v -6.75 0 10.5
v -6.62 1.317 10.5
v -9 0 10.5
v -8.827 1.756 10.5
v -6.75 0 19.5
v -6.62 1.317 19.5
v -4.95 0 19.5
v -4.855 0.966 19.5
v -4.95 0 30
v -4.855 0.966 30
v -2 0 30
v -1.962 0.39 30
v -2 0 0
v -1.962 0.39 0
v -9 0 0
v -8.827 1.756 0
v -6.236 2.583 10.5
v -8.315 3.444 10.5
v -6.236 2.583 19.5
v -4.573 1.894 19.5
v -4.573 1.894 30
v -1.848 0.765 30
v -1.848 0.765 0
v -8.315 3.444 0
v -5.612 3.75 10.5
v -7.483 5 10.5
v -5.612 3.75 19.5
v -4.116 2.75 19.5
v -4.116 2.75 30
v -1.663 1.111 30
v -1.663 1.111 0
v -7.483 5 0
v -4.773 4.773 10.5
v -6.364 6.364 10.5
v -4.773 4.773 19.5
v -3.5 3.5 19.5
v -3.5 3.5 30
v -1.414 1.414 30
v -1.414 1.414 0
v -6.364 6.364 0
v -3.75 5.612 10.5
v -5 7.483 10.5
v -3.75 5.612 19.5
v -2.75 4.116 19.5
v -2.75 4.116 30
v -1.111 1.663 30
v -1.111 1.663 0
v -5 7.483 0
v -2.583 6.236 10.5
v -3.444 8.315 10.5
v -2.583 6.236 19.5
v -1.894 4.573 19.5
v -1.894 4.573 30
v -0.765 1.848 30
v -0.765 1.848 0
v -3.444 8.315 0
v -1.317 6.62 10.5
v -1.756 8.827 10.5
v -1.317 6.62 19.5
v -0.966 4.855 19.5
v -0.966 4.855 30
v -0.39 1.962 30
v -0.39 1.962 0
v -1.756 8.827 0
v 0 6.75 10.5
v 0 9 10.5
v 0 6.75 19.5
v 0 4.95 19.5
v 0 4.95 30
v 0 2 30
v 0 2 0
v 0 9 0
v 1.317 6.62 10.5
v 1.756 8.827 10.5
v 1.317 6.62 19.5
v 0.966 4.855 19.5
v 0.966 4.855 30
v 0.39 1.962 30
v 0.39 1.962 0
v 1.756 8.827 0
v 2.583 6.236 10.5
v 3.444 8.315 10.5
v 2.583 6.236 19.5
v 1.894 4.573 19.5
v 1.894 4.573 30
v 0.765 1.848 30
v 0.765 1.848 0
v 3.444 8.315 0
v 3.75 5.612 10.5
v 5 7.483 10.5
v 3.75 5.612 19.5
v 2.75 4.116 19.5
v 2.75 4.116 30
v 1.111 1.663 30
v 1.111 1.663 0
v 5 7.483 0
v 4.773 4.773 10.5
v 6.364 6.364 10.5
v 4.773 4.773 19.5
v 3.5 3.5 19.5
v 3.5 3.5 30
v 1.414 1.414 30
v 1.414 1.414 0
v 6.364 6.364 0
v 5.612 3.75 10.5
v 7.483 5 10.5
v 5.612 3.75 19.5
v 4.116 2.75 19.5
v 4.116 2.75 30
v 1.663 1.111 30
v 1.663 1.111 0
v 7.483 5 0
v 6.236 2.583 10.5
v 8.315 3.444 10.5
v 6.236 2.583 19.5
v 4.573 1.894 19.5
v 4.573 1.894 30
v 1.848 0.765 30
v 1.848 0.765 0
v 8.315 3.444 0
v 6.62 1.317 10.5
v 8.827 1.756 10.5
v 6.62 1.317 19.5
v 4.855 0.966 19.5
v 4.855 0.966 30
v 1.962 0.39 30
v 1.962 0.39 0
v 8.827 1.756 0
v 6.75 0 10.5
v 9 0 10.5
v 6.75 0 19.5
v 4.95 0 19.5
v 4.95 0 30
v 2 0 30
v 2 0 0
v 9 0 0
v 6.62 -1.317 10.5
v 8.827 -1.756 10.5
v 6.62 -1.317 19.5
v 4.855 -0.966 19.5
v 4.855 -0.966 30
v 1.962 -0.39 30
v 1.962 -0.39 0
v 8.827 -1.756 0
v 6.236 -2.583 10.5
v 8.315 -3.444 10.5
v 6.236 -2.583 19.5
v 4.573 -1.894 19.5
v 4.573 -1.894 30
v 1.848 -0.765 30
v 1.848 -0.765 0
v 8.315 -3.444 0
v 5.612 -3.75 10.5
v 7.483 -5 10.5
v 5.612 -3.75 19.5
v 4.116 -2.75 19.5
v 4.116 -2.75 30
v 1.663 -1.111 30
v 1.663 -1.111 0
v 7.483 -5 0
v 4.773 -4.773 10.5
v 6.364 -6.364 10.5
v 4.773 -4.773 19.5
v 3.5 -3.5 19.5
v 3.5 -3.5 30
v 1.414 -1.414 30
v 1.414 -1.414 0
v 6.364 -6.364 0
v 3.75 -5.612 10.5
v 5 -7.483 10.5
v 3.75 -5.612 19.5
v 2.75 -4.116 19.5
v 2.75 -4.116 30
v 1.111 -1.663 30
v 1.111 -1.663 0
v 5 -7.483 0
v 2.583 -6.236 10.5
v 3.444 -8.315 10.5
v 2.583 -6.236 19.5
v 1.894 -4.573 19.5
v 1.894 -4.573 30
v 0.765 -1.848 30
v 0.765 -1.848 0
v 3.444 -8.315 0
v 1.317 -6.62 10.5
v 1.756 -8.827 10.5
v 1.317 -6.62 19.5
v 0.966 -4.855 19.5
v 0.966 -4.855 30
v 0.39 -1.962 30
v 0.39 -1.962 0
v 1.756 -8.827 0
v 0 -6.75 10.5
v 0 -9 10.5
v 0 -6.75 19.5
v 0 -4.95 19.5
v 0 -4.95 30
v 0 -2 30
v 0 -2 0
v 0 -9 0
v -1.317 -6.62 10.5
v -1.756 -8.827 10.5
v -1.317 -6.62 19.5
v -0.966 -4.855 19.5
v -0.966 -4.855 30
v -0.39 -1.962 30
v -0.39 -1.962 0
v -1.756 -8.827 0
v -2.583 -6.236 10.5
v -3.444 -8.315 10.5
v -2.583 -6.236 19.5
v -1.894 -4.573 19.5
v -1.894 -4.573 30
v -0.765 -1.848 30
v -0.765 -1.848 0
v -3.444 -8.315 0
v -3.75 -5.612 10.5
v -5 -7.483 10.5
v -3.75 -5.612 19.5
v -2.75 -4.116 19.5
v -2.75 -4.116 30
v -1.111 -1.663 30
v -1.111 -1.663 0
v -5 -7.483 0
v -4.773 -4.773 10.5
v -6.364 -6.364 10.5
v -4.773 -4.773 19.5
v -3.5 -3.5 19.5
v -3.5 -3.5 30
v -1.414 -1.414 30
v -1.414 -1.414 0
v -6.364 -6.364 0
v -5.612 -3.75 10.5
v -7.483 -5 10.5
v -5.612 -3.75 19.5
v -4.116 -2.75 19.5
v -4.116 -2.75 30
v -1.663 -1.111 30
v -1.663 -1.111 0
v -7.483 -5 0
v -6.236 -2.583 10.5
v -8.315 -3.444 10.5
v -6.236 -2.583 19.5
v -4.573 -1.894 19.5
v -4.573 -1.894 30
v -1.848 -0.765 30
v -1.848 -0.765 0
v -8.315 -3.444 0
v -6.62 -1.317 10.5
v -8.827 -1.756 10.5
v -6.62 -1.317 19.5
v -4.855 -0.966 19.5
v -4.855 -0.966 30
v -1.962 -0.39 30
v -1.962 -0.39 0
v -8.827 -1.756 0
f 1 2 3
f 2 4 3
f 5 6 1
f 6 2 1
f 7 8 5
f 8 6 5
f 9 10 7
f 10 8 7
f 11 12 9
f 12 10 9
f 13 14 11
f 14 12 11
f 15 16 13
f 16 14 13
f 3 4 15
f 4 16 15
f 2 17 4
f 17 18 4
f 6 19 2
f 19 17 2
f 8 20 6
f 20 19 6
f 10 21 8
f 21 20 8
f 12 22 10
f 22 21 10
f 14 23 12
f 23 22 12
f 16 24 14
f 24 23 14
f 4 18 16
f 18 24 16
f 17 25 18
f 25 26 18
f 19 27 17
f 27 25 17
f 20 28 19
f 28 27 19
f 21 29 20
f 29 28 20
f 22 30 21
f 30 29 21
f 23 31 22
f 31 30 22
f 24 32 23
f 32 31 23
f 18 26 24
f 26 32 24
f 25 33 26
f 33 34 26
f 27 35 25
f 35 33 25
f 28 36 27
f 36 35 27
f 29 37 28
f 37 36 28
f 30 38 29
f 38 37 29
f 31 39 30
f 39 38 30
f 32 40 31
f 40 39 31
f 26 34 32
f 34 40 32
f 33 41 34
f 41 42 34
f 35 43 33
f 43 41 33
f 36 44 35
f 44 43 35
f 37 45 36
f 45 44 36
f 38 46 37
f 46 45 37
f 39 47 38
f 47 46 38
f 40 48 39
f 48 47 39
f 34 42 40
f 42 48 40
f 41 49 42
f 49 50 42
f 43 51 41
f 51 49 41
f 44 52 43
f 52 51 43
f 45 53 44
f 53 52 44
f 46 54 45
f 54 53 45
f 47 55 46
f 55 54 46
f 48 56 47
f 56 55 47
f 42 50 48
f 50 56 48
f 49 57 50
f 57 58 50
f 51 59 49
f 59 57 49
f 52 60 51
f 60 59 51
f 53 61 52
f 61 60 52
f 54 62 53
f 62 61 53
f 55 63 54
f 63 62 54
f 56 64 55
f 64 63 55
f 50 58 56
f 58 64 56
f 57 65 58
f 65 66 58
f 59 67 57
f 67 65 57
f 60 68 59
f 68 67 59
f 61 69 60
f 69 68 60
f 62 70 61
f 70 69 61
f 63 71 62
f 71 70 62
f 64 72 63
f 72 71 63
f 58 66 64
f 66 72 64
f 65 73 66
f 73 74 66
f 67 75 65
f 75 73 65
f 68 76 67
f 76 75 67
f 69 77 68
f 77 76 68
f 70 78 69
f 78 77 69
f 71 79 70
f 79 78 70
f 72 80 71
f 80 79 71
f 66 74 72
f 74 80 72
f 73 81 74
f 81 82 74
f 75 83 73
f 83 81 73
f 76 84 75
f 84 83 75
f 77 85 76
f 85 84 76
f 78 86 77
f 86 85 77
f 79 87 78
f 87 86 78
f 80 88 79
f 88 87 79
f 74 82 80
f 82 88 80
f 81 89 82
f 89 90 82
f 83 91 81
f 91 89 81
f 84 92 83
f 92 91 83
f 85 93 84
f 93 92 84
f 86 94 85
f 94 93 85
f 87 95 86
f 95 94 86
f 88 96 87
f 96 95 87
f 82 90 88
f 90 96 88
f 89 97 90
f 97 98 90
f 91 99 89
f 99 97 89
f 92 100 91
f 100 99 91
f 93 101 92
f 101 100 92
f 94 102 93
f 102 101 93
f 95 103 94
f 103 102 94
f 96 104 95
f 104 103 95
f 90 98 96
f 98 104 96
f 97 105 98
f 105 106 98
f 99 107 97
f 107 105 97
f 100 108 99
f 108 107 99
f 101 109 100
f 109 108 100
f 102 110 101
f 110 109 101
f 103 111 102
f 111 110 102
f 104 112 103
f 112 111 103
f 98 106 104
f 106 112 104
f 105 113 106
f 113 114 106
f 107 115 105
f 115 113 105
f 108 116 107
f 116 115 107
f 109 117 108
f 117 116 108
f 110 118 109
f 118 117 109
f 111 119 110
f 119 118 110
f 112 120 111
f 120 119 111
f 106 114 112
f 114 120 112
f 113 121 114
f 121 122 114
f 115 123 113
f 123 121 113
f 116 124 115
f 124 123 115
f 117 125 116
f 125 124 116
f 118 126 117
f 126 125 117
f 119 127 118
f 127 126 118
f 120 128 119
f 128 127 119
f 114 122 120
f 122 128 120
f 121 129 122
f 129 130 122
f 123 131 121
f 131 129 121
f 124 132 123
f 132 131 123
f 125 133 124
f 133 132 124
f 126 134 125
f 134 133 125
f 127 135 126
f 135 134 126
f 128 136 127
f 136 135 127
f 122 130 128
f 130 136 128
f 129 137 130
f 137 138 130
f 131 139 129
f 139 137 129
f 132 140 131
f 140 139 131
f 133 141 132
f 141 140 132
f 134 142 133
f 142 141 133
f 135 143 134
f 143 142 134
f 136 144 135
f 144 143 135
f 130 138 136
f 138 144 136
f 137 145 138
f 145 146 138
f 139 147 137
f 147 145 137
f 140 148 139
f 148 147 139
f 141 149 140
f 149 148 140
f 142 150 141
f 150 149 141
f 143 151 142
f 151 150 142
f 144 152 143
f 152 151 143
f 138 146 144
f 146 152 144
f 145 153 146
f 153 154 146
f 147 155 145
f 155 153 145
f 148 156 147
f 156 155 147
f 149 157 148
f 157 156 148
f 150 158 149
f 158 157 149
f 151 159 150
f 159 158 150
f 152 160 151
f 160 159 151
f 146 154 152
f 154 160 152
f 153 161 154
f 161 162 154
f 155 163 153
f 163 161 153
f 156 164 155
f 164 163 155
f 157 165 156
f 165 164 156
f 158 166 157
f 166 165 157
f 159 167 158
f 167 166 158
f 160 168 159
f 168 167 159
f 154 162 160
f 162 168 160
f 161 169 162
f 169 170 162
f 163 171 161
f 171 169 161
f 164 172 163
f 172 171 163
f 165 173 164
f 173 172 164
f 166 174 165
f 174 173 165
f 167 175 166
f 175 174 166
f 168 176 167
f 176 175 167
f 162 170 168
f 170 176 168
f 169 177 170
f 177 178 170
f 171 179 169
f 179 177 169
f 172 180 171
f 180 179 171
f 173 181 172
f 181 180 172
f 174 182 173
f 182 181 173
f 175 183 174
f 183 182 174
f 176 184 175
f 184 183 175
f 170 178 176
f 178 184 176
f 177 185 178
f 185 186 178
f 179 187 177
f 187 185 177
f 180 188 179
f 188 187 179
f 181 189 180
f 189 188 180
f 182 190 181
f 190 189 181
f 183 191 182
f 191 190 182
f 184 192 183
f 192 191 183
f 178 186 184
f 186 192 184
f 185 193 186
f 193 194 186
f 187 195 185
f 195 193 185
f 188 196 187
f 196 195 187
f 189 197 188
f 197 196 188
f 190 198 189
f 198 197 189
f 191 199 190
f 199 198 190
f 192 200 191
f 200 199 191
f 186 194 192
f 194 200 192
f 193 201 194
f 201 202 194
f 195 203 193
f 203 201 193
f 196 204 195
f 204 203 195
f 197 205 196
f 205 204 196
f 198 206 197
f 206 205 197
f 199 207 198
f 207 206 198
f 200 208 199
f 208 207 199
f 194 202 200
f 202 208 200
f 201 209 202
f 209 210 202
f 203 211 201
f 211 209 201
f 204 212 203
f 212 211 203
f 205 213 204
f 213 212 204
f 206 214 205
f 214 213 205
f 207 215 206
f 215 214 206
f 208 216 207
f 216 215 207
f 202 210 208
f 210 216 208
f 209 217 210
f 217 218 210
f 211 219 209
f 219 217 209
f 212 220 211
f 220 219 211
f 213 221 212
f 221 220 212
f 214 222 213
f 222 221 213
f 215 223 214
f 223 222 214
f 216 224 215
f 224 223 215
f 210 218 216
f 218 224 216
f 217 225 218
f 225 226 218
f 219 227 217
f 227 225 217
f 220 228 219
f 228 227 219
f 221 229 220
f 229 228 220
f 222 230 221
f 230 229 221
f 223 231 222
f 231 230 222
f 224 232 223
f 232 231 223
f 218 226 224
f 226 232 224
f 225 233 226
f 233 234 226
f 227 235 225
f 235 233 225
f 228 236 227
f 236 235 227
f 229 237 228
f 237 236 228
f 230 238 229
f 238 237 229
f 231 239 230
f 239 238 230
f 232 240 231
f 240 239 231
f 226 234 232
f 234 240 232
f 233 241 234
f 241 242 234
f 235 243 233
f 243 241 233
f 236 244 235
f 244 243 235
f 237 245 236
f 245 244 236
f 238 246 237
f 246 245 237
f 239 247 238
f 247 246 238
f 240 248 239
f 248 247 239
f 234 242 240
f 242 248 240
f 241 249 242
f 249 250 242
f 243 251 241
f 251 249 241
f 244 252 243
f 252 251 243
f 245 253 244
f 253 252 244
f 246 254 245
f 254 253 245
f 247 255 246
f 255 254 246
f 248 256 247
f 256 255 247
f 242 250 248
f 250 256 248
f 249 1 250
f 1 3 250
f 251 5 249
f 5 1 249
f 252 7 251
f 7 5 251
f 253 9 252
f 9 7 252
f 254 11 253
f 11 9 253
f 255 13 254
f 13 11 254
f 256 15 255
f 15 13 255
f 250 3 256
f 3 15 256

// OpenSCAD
$fn = 32;

// ----------------------------------------------------------------------
// Profiled standoff: stepped spacer, 30 mm long, bore 4 mm
// ----------------------------------------------------------------------

// --- parameters (mm) ---
revolve_angle = 360;      // full turn around the Z axis
profile_points = 8;       // points of the closed outline

profile = [[2, 0], [9, 0], [9, 10.5], [6.75, 10.5], [6.75, 19.5], [4.95, 19.5], [4.95, 30], [2, 30]];  // single closed polygon, 8 points, counter clockwise

// --- the one profile operation ---
rotate_extrude(angle = revolve_angle) polygon(points = profile);
